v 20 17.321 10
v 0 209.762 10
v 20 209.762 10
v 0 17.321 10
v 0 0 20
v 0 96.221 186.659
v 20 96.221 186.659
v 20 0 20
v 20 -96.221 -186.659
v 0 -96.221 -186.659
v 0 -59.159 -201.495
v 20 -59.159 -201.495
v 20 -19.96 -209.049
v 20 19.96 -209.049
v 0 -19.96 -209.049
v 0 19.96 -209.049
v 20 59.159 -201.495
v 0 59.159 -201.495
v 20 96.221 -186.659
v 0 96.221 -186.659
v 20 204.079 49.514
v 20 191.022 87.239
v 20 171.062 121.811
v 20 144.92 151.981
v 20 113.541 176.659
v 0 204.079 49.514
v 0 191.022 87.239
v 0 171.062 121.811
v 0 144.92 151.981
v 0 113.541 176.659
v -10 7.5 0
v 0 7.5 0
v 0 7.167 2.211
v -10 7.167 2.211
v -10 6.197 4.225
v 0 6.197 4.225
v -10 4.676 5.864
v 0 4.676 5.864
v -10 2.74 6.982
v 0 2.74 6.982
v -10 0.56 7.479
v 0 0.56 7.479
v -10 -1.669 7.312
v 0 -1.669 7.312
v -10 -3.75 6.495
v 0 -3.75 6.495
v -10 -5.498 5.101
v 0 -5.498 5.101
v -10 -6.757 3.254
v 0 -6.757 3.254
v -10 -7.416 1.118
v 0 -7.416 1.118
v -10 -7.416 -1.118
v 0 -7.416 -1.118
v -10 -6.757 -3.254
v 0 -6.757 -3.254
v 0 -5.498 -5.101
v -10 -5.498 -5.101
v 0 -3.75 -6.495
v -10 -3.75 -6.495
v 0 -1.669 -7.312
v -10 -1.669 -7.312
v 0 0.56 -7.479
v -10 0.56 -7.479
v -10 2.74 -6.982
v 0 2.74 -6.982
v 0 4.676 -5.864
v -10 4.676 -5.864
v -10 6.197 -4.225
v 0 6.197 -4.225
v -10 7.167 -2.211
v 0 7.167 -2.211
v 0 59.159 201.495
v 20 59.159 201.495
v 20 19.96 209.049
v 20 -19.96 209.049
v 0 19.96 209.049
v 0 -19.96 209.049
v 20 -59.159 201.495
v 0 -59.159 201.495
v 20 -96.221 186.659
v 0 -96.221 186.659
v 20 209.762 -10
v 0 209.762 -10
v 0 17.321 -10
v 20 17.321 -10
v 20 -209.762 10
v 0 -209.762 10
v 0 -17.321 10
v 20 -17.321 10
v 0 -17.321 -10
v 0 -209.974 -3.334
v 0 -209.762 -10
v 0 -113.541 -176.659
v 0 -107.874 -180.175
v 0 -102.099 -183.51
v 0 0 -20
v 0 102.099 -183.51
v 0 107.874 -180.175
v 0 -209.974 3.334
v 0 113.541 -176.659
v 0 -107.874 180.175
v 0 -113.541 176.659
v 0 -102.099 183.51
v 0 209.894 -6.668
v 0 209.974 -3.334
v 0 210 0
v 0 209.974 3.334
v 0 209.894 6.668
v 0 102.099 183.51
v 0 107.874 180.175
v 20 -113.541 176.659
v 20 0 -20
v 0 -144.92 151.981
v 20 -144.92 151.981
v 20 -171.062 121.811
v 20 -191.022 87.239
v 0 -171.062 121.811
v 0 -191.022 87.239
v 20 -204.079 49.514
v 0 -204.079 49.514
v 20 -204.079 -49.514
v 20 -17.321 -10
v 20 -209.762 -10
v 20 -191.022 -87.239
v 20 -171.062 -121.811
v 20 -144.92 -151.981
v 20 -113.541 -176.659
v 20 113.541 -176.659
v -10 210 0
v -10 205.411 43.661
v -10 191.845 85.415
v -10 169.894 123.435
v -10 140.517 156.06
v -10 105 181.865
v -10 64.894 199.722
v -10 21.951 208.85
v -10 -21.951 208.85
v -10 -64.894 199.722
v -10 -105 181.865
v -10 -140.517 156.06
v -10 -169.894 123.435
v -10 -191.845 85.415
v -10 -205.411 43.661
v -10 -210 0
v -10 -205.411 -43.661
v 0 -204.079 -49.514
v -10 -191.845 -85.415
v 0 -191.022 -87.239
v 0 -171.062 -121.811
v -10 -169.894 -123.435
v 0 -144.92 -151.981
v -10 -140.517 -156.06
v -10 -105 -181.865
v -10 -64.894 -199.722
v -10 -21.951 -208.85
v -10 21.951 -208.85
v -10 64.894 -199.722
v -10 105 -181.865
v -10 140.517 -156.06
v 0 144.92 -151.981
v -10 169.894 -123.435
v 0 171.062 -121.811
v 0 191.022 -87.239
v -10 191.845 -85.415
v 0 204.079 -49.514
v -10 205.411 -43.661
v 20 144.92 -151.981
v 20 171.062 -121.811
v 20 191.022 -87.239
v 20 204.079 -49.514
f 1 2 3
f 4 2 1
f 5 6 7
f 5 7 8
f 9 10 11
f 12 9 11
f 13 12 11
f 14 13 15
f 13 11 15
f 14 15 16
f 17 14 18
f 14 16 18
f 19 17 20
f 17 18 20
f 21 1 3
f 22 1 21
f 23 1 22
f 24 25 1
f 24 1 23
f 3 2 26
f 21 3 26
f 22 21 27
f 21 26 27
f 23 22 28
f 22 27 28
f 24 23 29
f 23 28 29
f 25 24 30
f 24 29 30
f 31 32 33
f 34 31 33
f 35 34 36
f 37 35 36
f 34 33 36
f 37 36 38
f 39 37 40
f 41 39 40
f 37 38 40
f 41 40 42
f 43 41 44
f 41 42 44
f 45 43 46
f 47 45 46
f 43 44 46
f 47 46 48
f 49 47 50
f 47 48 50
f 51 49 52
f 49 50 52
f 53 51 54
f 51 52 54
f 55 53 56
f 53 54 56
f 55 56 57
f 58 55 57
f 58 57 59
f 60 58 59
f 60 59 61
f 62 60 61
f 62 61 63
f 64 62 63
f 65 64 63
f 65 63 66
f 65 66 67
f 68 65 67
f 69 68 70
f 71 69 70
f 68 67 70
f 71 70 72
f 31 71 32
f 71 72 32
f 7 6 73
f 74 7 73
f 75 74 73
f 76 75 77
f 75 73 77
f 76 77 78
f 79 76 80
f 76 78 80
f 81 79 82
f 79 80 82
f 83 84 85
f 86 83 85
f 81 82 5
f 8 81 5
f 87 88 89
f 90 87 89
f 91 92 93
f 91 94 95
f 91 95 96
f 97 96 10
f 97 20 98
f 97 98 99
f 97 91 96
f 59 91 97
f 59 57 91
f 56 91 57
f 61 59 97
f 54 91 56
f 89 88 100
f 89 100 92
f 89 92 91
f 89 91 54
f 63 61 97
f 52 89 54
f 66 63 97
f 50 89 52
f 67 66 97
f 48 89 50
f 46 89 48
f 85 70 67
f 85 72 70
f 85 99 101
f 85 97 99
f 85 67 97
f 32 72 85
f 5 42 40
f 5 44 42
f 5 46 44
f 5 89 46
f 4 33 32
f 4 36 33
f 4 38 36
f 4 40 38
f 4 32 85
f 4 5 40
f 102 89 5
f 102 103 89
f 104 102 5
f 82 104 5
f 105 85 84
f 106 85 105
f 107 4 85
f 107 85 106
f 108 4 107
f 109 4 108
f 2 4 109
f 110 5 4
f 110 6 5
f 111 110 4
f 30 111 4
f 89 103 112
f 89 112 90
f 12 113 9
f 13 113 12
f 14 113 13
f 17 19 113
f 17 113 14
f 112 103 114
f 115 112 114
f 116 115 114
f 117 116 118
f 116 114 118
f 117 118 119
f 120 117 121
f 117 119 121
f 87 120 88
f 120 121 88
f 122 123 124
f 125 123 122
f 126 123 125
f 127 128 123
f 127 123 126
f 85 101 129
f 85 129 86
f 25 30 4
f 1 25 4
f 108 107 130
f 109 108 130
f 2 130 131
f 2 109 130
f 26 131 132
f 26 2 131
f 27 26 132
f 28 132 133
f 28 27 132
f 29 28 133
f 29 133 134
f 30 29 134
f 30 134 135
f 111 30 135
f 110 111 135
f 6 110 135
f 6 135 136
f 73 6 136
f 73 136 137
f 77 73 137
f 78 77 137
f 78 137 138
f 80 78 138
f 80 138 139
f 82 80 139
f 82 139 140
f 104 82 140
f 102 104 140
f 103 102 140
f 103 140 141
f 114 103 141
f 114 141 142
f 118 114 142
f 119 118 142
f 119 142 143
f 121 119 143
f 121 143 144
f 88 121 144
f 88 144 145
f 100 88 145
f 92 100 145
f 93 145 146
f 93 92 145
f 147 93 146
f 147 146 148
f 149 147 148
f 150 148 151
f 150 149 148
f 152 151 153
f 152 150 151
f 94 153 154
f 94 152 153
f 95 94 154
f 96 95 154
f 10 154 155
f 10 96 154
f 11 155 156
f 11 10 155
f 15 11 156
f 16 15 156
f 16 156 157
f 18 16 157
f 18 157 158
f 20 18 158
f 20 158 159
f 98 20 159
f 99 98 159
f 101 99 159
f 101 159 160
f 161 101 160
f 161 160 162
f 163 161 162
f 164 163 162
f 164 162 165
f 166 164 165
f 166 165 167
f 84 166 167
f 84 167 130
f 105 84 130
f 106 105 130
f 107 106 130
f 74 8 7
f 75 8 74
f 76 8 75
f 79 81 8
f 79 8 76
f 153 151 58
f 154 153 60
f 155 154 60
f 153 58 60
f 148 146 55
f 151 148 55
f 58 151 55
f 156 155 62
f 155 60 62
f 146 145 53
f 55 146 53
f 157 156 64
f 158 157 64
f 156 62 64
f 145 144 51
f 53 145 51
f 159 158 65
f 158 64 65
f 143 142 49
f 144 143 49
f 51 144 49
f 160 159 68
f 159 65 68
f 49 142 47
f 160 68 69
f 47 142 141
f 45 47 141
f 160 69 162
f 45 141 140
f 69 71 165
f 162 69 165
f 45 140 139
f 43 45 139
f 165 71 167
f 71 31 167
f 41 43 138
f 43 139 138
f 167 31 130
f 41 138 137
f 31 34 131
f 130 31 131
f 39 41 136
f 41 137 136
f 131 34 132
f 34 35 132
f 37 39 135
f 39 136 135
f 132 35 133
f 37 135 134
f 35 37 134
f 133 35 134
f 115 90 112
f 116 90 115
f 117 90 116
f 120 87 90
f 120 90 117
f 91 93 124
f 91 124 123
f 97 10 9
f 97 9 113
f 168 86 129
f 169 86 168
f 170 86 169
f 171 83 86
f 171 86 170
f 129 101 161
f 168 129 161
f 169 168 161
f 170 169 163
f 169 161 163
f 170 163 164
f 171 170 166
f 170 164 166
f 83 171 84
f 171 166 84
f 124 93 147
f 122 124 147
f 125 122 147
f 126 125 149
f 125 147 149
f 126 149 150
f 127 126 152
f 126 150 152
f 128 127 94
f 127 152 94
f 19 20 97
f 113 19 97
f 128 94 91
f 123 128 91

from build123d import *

# Parameters (mm, degrees)
SKETCH_0_R         = 210
SKETCH_0_R_2       = 7.5
PAD_DEPTH          = 10
PAD001_DEPTH       = 20
POLARPATTERN_COUNT = 6


with BuildPart() as part:
    # Sketch_0 (on LCS_) → Pad (new body)
    with BuildSketch(Plane.YZ):
        Circle(SKETCH_0_R)
        Circle(SKETCH_0_R_2, mode=Mode.SUBTRACT)
    extrude(amount=-PAD_DEPTH)

    # Sketch_1 (on LCS_) → Pad001 (join)
    with BuildSketch(Plane.YZ):
        with BuildLine():
            Line((113.541139, 176.659021), (17.320508, 10))
            Line((209.76177, 10), (17.320508, 10))
            ThreePointArc((209.76177, 10), (181.865335, 105), (113.541139, 176.659021))
        make_face()
    pad001 = extrude(amount=PAD001_DEPTH)

    # PolarPattern: Pad001 ×6 about axis
    polarpattern_axis = Axis((0, 0, 0), (1, 0, 0))
    for i in range(1, POLARPATTERN_COUNT):
        add(pad001.rotate(polarpattern_axis, i * 360 / POLARPATTERN_COUNT))


solid = part.part
